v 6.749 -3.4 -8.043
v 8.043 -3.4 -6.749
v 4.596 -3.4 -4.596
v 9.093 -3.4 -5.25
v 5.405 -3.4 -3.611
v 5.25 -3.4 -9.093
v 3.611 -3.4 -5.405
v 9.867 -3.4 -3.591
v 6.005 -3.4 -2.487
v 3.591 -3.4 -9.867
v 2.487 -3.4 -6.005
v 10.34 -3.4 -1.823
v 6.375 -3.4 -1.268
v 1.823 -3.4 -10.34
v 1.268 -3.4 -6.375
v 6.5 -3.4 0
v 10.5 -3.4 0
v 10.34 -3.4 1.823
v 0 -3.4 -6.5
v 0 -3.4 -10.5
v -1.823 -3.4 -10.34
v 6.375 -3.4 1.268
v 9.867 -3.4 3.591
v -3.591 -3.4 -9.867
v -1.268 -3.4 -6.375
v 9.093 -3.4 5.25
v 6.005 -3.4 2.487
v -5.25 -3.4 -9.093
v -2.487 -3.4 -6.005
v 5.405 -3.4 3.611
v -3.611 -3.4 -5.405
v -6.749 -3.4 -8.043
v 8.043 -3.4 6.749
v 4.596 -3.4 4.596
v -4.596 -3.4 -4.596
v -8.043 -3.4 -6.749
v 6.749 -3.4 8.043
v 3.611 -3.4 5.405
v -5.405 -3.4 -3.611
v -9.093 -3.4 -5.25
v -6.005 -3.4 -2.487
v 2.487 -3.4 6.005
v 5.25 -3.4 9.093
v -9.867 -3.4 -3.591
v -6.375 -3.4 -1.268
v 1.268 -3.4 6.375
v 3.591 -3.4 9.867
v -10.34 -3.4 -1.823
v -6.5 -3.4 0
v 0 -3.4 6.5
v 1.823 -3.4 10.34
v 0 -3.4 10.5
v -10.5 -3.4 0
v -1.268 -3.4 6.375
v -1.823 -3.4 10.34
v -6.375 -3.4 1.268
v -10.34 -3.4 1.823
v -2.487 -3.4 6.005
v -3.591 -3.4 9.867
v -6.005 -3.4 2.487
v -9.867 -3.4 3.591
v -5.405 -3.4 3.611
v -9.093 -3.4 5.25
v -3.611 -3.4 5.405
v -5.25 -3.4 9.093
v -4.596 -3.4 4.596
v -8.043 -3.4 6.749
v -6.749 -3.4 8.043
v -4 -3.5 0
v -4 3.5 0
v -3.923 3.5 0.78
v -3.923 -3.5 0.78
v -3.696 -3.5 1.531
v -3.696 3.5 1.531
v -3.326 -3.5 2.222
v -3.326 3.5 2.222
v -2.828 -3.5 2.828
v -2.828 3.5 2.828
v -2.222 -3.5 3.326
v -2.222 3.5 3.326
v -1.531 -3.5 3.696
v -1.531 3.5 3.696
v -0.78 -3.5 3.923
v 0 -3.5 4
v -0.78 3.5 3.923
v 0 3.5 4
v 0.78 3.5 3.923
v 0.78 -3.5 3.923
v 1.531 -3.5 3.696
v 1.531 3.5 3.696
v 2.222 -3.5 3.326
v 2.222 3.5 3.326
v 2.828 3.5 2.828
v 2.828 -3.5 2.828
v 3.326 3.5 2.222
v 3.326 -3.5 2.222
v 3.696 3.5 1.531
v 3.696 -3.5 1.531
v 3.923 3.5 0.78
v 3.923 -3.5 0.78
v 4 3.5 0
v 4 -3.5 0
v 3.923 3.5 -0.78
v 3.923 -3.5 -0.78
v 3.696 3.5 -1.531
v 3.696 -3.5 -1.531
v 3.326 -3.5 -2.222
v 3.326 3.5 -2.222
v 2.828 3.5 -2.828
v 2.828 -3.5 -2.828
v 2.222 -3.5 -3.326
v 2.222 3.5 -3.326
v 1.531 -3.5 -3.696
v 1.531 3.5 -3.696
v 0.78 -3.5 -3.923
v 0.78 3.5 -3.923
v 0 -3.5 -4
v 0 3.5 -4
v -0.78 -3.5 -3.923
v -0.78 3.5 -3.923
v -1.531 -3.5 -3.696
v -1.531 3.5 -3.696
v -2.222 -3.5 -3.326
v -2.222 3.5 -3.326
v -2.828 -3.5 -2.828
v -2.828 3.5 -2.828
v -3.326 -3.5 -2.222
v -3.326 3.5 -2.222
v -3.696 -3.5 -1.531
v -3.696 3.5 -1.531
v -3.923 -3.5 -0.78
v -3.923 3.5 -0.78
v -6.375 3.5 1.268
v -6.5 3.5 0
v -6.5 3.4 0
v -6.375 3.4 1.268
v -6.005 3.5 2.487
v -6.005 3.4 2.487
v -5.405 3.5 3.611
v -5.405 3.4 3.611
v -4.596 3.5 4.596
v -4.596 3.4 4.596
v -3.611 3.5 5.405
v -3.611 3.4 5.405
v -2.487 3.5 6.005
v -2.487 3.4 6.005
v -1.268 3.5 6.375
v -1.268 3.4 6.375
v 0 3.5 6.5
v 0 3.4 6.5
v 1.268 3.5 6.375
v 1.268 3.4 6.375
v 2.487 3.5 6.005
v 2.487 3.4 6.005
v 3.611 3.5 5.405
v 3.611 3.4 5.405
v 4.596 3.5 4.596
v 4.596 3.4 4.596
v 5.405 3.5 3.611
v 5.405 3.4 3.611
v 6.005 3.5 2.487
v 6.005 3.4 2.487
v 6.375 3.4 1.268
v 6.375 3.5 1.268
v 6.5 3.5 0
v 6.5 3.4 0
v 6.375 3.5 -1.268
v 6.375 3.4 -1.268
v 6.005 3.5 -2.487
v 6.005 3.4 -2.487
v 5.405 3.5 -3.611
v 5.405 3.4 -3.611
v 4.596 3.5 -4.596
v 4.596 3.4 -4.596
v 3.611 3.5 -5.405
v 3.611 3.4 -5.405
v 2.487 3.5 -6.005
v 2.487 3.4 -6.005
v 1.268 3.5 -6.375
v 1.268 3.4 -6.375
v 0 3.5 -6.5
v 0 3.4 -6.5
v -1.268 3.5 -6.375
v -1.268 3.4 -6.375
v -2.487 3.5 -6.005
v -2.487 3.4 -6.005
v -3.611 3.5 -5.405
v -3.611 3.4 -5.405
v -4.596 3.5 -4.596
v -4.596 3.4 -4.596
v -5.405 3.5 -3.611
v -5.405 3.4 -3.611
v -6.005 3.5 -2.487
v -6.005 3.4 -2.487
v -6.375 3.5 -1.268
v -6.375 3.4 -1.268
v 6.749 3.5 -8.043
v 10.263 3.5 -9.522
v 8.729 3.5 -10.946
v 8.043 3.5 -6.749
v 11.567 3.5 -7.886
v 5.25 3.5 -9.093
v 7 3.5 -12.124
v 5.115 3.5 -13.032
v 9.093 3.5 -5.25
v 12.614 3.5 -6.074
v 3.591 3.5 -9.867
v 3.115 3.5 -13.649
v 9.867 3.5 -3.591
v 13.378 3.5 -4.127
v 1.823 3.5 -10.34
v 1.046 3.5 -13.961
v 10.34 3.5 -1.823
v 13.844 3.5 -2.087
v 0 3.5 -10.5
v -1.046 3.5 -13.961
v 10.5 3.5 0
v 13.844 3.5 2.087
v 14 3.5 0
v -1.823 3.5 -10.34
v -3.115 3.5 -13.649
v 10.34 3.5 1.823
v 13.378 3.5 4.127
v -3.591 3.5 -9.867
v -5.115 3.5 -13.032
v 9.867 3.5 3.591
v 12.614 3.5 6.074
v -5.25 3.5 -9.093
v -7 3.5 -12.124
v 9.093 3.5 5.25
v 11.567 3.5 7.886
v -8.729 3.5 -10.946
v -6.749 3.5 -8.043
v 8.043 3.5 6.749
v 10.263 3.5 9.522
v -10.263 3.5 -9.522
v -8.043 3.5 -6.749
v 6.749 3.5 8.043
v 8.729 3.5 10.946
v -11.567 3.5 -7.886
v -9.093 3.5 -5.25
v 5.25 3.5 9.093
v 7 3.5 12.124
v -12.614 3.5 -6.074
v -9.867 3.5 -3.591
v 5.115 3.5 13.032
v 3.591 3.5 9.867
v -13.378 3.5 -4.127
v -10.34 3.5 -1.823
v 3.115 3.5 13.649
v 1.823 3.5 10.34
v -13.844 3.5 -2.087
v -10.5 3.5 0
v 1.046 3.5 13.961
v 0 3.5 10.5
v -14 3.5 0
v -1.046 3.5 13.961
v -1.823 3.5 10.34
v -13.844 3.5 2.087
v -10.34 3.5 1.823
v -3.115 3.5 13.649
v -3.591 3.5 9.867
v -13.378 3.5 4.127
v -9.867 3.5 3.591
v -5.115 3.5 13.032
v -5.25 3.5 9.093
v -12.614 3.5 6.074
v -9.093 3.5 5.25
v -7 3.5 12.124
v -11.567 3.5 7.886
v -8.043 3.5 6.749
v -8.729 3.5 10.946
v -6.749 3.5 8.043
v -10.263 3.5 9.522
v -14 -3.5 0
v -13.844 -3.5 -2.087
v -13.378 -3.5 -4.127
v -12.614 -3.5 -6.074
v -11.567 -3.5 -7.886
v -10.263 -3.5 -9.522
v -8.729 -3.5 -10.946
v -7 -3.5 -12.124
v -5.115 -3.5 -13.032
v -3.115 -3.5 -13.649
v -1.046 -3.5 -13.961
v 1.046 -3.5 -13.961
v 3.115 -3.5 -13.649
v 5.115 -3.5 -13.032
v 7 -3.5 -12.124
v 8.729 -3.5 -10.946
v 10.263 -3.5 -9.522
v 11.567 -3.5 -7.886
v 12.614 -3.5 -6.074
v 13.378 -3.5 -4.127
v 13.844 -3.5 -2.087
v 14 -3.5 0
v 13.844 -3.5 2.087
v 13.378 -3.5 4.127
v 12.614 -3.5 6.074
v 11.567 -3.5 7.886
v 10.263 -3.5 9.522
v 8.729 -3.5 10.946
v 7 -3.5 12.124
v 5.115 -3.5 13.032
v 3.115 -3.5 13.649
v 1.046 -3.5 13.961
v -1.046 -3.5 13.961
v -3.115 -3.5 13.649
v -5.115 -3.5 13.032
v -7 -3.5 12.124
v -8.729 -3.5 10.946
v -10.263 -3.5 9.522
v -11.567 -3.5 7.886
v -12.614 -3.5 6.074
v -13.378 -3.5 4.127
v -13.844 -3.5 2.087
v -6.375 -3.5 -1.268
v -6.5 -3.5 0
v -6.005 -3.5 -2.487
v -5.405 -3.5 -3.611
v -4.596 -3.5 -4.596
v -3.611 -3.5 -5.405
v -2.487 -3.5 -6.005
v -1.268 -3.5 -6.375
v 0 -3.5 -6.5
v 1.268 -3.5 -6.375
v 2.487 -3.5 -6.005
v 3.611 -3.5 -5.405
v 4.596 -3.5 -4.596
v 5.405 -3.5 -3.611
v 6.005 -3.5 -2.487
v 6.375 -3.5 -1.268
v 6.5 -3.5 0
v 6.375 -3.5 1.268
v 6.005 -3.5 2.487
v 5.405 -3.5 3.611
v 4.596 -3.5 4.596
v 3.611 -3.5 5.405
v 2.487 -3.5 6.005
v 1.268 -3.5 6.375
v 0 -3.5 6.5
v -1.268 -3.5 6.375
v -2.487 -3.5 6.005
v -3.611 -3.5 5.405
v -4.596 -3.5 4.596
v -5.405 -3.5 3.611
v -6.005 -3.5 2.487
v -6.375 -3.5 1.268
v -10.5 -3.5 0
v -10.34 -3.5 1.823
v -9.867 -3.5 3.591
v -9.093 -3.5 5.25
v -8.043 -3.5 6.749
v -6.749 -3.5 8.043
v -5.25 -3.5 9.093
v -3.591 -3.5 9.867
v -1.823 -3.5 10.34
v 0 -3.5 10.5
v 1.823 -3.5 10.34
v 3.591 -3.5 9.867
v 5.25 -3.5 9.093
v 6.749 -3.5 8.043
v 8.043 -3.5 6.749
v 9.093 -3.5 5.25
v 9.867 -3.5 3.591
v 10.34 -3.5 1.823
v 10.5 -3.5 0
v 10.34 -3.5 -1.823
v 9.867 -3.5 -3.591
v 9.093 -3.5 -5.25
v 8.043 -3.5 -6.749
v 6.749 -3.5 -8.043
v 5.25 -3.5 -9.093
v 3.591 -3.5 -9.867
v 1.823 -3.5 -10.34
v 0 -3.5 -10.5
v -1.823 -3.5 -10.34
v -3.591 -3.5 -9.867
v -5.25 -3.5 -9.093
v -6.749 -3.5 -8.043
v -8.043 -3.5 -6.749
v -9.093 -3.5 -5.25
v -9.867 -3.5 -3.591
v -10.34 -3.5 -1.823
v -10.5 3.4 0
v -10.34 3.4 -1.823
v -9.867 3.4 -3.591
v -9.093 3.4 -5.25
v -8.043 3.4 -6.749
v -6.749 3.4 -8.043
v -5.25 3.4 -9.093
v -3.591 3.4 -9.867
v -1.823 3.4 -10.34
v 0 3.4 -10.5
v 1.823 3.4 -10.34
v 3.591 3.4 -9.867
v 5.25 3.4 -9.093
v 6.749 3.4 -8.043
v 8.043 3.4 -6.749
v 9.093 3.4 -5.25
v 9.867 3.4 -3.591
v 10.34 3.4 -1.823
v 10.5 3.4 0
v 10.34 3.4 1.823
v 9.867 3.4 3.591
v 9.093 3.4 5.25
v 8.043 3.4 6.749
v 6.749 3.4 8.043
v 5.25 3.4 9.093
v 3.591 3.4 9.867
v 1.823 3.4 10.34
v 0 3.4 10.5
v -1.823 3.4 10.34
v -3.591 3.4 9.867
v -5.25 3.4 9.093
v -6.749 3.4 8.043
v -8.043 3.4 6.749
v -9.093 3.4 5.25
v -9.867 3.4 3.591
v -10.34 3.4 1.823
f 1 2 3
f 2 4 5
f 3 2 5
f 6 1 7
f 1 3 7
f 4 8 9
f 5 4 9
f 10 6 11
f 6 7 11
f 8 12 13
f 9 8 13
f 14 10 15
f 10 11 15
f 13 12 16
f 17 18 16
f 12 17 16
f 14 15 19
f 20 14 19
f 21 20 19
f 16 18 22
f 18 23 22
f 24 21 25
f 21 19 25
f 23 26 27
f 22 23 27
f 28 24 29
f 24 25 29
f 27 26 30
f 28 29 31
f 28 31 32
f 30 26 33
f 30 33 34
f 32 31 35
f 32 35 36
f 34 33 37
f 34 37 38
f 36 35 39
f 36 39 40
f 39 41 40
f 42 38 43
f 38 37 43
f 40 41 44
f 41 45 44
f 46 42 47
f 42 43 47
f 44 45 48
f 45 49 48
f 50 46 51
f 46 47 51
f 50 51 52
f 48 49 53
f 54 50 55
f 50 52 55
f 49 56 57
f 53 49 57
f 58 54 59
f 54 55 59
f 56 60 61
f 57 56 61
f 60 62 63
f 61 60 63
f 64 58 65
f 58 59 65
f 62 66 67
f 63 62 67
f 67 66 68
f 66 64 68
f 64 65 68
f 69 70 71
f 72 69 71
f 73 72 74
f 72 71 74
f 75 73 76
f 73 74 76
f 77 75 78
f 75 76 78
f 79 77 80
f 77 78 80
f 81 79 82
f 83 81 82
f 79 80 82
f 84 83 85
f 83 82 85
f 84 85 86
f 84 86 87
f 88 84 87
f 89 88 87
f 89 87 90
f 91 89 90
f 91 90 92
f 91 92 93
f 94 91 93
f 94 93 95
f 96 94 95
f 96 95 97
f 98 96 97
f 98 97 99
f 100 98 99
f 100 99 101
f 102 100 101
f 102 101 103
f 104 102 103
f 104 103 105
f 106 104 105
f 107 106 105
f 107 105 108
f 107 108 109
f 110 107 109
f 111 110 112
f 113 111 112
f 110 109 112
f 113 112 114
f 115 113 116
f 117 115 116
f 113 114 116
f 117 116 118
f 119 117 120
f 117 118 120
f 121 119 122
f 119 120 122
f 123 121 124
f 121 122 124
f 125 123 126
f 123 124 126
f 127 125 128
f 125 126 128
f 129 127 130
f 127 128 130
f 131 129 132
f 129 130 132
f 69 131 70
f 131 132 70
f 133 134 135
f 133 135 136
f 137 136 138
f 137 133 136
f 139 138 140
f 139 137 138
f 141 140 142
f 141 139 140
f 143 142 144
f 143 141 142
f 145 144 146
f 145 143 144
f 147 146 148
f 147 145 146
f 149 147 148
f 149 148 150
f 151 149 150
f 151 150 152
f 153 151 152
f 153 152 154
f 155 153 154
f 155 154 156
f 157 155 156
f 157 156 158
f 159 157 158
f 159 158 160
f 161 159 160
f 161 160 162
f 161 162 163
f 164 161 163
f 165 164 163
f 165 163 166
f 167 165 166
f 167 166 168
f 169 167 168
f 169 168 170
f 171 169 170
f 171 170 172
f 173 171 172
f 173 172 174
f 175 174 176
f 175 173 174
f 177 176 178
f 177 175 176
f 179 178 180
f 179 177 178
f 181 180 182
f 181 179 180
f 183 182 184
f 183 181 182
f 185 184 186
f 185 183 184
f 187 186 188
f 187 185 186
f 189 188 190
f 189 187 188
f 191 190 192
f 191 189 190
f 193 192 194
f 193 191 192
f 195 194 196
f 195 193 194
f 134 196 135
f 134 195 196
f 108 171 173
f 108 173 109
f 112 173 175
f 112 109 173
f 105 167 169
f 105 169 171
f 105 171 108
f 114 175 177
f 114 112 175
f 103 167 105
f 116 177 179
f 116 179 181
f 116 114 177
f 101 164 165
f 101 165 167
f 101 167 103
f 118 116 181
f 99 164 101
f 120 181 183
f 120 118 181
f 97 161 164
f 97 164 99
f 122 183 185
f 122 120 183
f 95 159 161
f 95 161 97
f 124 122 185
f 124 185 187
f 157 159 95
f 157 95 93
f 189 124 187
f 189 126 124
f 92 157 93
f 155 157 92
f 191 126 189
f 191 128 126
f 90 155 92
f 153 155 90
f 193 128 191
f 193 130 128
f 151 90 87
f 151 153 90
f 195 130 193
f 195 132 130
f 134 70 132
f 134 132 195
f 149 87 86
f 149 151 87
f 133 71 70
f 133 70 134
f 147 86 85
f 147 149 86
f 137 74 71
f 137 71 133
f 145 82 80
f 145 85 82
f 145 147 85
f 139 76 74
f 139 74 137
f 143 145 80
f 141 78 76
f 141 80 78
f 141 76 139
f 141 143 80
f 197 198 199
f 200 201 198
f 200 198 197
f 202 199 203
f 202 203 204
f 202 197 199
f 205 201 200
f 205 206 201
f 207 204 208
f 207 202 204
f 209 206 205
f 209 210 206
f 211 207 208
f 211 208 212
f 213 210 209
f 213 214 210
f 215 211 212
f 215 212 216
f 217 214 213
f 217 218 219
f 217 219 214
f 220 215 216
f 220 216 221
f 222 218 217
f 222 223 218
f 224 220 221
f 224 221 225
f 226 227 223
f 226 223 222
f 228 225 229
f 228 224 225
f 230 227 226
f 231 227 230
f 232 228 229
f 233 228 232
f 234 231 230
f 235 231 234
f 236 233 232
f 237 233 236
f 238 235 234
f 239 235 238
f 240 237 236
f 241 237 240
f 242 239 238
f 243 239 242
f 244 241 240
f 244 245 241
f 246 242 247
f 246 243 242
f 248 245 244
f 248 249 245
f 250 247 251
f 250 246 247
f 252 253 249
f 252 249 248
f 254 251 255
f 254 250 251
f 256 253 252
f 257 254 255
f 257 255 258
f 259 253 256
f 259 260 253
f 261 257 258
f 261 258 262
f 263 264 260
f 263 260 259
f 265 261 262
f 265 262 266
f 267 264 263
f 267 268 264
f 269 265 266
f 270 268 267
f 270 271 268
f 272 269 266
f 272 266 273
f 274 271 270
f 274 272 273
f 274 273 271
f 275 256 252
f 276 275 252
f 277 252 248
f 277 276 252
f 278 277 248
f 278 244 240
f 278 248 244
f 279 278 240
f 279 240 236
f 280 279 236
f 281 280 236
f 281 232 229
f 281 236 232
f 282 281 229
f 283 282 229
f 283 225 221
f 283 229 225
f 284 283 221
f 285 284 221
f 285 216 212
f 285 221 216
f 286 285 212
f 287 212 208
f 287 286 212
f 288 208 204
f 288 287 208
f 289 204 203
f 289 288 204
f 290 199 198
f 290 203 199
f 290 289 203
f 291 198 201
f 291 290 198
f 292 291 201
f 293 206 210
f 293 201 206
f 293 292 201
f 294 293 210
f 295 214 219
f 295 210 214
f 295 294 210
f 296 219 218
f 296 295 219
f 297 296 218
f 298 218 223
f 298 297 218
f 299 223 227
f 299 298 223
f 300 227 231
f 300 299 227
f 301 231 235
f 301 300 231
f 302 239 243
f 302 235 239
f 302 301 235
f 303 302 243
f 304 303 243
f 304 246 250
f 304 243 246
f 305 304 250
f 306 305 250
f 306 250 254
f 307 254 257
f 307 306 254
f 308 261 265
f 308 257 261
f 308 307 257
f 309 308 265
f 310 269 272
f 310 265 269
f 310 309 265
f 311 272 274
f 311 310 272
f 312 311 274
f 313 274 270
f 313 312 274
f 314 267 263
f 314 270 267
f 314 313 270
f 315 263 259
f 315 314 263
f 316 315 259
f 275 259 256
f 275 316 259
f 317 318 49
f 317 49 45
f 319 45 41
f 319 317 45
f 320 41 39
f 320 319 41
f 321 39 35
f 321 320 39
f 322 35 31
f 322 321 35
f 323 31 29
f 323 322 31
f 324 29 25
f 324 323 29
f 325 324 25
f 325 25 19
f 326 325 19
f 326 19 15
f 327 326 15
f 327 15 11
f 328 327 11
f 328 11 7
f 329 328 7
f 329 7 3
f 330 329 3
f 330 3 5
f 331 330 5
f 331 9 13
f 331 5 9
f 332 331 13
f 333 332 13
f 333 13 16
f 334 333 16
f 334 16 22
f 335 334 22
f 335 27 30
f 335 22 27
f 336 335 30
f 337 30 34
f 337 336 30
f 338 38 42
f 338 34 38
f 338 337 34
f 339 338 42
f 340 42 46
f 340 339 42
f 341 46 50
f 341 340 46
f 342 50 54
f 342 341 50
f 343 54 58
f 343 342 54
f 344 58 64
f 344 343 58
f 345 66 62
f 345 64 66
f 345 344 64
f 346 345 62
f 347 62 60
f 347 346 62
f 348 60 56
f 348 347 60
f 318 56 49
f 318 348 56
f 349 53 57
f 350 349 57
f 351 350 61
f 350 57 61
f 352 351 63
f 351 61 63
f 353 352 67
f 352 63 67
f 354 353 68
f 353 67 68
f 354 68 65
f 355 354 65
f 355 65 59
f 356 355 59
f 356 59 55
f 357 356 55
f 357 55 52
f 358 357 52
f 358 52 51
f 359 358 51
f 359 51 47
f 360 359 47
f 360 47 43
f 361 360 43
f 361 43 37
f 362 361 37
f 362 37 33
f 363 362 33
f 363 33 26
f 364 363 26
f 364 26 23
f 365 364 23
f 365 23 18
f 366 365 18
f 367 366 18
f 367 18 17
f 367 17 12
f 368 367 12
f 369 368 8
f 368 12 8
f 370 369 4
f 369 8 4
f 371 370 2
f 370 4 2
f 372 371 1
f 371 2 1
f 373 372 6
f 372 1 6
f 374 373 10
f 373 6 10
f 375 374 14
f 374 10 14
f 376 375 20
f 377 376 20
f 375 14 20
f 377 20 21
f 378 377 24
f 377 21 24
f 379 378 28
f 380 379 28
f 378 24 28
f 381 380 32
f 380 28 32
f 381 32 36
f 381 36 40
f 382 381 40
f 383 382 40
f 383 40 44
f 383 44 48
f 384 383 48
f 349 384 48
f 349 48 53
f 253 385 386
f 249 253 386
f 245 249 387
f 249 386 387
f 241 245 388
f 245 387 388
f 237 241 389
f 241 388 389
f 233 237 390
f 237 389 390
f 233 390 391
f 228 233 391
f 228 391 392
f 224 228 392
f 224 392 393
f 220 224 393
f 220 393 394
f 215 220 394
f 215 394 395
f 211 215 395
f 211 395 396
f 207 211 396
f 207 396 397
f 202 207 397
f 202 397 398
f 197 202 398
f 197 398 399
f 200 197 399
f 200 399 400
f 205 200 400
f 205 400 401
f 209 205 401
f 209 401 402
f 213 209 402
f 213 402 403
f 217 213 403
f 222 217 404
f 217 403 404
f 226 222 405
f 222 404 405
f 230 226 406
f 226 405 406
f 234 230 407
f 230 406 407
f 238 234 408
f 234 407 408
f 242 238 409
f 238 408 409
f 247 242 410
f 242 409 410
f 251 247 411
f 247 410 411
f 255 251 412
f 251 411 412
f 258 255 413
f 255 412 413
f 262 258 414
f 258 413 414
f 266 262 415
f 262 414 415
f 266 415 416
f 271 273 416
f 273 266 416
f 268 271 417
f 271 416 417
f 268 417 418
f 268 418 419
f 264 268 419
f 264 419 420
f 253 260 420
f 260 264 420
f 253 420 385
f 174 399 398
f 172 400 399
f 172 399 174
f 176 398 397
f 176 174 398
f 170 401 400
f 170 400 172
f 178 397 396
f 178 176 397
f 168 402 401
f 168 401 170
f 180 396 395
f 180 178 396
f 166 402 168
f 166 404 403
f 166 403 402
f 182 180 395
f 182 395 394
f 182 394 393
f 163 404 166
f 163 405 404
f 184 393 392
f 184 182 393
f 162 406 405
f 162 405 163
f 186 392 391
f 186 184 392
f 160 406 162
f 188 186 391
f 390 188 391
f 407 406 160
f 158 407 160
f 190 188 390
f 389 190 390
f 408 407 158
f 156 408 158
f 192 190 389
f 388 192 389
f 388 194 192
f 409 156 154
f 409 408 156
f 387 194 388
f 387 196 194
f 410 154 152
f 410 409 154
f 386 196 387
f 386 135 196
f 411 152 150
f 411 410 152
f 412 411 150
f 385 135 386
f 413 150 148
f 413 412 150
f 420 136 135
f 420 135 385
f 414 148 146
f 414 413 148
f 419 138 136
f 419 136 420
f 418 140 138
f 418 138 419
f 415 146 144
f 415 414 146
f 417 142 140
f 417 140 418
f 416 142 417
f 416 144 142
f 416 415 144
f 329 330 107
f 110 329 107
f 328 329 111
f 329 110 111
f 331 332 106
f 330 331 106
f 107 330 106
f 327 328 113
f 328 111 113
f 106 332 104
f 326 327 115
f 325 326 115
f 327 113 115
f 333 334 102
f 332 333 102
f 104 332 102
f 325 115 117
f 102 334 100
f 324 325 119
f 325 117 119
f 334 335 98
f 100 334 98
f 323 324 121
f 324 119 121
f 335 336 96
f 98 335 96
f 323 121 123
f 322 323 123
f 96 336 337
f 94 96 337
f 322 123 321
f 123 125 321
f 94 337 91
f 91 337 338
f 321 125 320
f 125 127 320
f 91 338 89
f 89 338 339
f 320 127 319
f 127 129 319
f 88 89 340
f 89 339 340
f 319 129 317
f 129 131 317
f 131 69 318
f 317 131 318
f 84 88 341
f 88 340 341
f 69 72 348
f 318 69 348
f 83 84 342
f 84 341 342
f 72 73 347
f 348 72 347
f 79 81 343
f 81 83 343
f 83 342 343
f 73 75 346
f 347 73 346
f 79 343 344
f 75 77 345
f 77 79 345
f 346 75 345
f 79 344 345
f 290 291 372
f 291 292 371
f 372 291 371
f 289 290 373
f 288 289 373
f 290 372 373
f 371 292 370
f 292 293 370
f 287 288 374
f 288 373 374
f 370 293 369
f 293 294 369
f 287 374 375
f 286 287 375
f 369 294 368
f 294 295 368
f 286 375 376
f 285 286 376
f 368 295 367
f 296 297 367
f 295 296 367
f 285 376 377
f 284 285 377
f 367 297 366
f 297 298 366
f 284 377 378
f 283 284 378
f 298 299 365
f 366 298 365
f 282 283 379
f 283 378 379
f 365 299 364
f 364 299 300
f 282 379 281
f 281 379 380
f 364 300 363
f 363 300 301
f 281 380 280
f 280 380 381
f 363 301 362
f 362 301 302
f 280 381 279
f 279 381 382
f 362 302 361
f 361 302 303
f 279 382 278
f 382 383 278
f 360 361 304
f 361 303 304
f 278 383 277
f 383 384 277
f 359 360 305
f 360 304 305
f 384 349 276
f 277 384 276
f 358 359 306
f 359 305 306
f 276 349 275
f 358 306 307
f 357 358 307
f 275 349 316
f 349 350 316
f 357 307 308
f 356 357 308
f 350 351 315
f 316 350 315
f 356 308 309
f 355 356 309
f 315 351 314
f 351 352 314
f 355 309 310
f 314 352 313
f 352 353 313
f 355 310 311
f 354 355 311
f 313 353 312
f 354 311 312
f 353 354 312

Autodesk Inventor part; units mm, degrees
ref_plane "YZ Plane" through (0, 0, 0) normal (1, 0, 0) x (0, 1, 0)
ref_plane "XZ Plane" through (0, 0, 0) normal (0, 1, 0) x (-1, 0, 0)
ref_plane "XY Plane" through (0, 0, 0) normal (0, 0, 1) x (1, 0, 0)
sketch "スケッチ1" plane through (0, 0, 0) normal (0, 0, 1) x (1, 0, 0)
  line L0 (-14, 3.5) -> (-14, -3.5)
  line L1 (-14, -3.5) -> (-10.5, -3.5)
  line L2 (-10.5, -3.5) -> (-10.5, -3.4)
  line L3 (-10.5, -3.4) -> (-6.5, -3.4)
  line L4 (-6.5, -3.4) -> (-6.5, -3.5)
  line L5 (-6.5, -3.5) -> (-4, -3.5)
  line L6 (-4, -3.5) -> (-4, 3.5)
  line L7 (0, 0) -> (-14, 0) construction
  line L8 (0, 0) -> (0, 3.5) construction
  line L9 (-14, 3.5) -> (-10.5, 3.5)
  line L10 (-10.5, 3.5) -> (-10.5, 3.4)
  line L11 (-10.5, 3.4) -> (-6.5, 3.4)
  line L12 (-6.5, 3.4) -> (-6.5, 3.5)
  line L13 (-6.5, 3.5) -> (-4, 3.5)
  dimension "d0" = 0.1
  dimension "d1" = 7
  dimension "d2" = 4
  dimension "d3" = 14
  dimension "d4" = 3.5
  dimension "d5" = 2.5
revolve "回転1" add sketch "スケッチ1" angle 360 about axis through (0, 0, 0) along (0, 1, 0)
properties part number "Gbear_28_8" material "ステンレス鋼"
